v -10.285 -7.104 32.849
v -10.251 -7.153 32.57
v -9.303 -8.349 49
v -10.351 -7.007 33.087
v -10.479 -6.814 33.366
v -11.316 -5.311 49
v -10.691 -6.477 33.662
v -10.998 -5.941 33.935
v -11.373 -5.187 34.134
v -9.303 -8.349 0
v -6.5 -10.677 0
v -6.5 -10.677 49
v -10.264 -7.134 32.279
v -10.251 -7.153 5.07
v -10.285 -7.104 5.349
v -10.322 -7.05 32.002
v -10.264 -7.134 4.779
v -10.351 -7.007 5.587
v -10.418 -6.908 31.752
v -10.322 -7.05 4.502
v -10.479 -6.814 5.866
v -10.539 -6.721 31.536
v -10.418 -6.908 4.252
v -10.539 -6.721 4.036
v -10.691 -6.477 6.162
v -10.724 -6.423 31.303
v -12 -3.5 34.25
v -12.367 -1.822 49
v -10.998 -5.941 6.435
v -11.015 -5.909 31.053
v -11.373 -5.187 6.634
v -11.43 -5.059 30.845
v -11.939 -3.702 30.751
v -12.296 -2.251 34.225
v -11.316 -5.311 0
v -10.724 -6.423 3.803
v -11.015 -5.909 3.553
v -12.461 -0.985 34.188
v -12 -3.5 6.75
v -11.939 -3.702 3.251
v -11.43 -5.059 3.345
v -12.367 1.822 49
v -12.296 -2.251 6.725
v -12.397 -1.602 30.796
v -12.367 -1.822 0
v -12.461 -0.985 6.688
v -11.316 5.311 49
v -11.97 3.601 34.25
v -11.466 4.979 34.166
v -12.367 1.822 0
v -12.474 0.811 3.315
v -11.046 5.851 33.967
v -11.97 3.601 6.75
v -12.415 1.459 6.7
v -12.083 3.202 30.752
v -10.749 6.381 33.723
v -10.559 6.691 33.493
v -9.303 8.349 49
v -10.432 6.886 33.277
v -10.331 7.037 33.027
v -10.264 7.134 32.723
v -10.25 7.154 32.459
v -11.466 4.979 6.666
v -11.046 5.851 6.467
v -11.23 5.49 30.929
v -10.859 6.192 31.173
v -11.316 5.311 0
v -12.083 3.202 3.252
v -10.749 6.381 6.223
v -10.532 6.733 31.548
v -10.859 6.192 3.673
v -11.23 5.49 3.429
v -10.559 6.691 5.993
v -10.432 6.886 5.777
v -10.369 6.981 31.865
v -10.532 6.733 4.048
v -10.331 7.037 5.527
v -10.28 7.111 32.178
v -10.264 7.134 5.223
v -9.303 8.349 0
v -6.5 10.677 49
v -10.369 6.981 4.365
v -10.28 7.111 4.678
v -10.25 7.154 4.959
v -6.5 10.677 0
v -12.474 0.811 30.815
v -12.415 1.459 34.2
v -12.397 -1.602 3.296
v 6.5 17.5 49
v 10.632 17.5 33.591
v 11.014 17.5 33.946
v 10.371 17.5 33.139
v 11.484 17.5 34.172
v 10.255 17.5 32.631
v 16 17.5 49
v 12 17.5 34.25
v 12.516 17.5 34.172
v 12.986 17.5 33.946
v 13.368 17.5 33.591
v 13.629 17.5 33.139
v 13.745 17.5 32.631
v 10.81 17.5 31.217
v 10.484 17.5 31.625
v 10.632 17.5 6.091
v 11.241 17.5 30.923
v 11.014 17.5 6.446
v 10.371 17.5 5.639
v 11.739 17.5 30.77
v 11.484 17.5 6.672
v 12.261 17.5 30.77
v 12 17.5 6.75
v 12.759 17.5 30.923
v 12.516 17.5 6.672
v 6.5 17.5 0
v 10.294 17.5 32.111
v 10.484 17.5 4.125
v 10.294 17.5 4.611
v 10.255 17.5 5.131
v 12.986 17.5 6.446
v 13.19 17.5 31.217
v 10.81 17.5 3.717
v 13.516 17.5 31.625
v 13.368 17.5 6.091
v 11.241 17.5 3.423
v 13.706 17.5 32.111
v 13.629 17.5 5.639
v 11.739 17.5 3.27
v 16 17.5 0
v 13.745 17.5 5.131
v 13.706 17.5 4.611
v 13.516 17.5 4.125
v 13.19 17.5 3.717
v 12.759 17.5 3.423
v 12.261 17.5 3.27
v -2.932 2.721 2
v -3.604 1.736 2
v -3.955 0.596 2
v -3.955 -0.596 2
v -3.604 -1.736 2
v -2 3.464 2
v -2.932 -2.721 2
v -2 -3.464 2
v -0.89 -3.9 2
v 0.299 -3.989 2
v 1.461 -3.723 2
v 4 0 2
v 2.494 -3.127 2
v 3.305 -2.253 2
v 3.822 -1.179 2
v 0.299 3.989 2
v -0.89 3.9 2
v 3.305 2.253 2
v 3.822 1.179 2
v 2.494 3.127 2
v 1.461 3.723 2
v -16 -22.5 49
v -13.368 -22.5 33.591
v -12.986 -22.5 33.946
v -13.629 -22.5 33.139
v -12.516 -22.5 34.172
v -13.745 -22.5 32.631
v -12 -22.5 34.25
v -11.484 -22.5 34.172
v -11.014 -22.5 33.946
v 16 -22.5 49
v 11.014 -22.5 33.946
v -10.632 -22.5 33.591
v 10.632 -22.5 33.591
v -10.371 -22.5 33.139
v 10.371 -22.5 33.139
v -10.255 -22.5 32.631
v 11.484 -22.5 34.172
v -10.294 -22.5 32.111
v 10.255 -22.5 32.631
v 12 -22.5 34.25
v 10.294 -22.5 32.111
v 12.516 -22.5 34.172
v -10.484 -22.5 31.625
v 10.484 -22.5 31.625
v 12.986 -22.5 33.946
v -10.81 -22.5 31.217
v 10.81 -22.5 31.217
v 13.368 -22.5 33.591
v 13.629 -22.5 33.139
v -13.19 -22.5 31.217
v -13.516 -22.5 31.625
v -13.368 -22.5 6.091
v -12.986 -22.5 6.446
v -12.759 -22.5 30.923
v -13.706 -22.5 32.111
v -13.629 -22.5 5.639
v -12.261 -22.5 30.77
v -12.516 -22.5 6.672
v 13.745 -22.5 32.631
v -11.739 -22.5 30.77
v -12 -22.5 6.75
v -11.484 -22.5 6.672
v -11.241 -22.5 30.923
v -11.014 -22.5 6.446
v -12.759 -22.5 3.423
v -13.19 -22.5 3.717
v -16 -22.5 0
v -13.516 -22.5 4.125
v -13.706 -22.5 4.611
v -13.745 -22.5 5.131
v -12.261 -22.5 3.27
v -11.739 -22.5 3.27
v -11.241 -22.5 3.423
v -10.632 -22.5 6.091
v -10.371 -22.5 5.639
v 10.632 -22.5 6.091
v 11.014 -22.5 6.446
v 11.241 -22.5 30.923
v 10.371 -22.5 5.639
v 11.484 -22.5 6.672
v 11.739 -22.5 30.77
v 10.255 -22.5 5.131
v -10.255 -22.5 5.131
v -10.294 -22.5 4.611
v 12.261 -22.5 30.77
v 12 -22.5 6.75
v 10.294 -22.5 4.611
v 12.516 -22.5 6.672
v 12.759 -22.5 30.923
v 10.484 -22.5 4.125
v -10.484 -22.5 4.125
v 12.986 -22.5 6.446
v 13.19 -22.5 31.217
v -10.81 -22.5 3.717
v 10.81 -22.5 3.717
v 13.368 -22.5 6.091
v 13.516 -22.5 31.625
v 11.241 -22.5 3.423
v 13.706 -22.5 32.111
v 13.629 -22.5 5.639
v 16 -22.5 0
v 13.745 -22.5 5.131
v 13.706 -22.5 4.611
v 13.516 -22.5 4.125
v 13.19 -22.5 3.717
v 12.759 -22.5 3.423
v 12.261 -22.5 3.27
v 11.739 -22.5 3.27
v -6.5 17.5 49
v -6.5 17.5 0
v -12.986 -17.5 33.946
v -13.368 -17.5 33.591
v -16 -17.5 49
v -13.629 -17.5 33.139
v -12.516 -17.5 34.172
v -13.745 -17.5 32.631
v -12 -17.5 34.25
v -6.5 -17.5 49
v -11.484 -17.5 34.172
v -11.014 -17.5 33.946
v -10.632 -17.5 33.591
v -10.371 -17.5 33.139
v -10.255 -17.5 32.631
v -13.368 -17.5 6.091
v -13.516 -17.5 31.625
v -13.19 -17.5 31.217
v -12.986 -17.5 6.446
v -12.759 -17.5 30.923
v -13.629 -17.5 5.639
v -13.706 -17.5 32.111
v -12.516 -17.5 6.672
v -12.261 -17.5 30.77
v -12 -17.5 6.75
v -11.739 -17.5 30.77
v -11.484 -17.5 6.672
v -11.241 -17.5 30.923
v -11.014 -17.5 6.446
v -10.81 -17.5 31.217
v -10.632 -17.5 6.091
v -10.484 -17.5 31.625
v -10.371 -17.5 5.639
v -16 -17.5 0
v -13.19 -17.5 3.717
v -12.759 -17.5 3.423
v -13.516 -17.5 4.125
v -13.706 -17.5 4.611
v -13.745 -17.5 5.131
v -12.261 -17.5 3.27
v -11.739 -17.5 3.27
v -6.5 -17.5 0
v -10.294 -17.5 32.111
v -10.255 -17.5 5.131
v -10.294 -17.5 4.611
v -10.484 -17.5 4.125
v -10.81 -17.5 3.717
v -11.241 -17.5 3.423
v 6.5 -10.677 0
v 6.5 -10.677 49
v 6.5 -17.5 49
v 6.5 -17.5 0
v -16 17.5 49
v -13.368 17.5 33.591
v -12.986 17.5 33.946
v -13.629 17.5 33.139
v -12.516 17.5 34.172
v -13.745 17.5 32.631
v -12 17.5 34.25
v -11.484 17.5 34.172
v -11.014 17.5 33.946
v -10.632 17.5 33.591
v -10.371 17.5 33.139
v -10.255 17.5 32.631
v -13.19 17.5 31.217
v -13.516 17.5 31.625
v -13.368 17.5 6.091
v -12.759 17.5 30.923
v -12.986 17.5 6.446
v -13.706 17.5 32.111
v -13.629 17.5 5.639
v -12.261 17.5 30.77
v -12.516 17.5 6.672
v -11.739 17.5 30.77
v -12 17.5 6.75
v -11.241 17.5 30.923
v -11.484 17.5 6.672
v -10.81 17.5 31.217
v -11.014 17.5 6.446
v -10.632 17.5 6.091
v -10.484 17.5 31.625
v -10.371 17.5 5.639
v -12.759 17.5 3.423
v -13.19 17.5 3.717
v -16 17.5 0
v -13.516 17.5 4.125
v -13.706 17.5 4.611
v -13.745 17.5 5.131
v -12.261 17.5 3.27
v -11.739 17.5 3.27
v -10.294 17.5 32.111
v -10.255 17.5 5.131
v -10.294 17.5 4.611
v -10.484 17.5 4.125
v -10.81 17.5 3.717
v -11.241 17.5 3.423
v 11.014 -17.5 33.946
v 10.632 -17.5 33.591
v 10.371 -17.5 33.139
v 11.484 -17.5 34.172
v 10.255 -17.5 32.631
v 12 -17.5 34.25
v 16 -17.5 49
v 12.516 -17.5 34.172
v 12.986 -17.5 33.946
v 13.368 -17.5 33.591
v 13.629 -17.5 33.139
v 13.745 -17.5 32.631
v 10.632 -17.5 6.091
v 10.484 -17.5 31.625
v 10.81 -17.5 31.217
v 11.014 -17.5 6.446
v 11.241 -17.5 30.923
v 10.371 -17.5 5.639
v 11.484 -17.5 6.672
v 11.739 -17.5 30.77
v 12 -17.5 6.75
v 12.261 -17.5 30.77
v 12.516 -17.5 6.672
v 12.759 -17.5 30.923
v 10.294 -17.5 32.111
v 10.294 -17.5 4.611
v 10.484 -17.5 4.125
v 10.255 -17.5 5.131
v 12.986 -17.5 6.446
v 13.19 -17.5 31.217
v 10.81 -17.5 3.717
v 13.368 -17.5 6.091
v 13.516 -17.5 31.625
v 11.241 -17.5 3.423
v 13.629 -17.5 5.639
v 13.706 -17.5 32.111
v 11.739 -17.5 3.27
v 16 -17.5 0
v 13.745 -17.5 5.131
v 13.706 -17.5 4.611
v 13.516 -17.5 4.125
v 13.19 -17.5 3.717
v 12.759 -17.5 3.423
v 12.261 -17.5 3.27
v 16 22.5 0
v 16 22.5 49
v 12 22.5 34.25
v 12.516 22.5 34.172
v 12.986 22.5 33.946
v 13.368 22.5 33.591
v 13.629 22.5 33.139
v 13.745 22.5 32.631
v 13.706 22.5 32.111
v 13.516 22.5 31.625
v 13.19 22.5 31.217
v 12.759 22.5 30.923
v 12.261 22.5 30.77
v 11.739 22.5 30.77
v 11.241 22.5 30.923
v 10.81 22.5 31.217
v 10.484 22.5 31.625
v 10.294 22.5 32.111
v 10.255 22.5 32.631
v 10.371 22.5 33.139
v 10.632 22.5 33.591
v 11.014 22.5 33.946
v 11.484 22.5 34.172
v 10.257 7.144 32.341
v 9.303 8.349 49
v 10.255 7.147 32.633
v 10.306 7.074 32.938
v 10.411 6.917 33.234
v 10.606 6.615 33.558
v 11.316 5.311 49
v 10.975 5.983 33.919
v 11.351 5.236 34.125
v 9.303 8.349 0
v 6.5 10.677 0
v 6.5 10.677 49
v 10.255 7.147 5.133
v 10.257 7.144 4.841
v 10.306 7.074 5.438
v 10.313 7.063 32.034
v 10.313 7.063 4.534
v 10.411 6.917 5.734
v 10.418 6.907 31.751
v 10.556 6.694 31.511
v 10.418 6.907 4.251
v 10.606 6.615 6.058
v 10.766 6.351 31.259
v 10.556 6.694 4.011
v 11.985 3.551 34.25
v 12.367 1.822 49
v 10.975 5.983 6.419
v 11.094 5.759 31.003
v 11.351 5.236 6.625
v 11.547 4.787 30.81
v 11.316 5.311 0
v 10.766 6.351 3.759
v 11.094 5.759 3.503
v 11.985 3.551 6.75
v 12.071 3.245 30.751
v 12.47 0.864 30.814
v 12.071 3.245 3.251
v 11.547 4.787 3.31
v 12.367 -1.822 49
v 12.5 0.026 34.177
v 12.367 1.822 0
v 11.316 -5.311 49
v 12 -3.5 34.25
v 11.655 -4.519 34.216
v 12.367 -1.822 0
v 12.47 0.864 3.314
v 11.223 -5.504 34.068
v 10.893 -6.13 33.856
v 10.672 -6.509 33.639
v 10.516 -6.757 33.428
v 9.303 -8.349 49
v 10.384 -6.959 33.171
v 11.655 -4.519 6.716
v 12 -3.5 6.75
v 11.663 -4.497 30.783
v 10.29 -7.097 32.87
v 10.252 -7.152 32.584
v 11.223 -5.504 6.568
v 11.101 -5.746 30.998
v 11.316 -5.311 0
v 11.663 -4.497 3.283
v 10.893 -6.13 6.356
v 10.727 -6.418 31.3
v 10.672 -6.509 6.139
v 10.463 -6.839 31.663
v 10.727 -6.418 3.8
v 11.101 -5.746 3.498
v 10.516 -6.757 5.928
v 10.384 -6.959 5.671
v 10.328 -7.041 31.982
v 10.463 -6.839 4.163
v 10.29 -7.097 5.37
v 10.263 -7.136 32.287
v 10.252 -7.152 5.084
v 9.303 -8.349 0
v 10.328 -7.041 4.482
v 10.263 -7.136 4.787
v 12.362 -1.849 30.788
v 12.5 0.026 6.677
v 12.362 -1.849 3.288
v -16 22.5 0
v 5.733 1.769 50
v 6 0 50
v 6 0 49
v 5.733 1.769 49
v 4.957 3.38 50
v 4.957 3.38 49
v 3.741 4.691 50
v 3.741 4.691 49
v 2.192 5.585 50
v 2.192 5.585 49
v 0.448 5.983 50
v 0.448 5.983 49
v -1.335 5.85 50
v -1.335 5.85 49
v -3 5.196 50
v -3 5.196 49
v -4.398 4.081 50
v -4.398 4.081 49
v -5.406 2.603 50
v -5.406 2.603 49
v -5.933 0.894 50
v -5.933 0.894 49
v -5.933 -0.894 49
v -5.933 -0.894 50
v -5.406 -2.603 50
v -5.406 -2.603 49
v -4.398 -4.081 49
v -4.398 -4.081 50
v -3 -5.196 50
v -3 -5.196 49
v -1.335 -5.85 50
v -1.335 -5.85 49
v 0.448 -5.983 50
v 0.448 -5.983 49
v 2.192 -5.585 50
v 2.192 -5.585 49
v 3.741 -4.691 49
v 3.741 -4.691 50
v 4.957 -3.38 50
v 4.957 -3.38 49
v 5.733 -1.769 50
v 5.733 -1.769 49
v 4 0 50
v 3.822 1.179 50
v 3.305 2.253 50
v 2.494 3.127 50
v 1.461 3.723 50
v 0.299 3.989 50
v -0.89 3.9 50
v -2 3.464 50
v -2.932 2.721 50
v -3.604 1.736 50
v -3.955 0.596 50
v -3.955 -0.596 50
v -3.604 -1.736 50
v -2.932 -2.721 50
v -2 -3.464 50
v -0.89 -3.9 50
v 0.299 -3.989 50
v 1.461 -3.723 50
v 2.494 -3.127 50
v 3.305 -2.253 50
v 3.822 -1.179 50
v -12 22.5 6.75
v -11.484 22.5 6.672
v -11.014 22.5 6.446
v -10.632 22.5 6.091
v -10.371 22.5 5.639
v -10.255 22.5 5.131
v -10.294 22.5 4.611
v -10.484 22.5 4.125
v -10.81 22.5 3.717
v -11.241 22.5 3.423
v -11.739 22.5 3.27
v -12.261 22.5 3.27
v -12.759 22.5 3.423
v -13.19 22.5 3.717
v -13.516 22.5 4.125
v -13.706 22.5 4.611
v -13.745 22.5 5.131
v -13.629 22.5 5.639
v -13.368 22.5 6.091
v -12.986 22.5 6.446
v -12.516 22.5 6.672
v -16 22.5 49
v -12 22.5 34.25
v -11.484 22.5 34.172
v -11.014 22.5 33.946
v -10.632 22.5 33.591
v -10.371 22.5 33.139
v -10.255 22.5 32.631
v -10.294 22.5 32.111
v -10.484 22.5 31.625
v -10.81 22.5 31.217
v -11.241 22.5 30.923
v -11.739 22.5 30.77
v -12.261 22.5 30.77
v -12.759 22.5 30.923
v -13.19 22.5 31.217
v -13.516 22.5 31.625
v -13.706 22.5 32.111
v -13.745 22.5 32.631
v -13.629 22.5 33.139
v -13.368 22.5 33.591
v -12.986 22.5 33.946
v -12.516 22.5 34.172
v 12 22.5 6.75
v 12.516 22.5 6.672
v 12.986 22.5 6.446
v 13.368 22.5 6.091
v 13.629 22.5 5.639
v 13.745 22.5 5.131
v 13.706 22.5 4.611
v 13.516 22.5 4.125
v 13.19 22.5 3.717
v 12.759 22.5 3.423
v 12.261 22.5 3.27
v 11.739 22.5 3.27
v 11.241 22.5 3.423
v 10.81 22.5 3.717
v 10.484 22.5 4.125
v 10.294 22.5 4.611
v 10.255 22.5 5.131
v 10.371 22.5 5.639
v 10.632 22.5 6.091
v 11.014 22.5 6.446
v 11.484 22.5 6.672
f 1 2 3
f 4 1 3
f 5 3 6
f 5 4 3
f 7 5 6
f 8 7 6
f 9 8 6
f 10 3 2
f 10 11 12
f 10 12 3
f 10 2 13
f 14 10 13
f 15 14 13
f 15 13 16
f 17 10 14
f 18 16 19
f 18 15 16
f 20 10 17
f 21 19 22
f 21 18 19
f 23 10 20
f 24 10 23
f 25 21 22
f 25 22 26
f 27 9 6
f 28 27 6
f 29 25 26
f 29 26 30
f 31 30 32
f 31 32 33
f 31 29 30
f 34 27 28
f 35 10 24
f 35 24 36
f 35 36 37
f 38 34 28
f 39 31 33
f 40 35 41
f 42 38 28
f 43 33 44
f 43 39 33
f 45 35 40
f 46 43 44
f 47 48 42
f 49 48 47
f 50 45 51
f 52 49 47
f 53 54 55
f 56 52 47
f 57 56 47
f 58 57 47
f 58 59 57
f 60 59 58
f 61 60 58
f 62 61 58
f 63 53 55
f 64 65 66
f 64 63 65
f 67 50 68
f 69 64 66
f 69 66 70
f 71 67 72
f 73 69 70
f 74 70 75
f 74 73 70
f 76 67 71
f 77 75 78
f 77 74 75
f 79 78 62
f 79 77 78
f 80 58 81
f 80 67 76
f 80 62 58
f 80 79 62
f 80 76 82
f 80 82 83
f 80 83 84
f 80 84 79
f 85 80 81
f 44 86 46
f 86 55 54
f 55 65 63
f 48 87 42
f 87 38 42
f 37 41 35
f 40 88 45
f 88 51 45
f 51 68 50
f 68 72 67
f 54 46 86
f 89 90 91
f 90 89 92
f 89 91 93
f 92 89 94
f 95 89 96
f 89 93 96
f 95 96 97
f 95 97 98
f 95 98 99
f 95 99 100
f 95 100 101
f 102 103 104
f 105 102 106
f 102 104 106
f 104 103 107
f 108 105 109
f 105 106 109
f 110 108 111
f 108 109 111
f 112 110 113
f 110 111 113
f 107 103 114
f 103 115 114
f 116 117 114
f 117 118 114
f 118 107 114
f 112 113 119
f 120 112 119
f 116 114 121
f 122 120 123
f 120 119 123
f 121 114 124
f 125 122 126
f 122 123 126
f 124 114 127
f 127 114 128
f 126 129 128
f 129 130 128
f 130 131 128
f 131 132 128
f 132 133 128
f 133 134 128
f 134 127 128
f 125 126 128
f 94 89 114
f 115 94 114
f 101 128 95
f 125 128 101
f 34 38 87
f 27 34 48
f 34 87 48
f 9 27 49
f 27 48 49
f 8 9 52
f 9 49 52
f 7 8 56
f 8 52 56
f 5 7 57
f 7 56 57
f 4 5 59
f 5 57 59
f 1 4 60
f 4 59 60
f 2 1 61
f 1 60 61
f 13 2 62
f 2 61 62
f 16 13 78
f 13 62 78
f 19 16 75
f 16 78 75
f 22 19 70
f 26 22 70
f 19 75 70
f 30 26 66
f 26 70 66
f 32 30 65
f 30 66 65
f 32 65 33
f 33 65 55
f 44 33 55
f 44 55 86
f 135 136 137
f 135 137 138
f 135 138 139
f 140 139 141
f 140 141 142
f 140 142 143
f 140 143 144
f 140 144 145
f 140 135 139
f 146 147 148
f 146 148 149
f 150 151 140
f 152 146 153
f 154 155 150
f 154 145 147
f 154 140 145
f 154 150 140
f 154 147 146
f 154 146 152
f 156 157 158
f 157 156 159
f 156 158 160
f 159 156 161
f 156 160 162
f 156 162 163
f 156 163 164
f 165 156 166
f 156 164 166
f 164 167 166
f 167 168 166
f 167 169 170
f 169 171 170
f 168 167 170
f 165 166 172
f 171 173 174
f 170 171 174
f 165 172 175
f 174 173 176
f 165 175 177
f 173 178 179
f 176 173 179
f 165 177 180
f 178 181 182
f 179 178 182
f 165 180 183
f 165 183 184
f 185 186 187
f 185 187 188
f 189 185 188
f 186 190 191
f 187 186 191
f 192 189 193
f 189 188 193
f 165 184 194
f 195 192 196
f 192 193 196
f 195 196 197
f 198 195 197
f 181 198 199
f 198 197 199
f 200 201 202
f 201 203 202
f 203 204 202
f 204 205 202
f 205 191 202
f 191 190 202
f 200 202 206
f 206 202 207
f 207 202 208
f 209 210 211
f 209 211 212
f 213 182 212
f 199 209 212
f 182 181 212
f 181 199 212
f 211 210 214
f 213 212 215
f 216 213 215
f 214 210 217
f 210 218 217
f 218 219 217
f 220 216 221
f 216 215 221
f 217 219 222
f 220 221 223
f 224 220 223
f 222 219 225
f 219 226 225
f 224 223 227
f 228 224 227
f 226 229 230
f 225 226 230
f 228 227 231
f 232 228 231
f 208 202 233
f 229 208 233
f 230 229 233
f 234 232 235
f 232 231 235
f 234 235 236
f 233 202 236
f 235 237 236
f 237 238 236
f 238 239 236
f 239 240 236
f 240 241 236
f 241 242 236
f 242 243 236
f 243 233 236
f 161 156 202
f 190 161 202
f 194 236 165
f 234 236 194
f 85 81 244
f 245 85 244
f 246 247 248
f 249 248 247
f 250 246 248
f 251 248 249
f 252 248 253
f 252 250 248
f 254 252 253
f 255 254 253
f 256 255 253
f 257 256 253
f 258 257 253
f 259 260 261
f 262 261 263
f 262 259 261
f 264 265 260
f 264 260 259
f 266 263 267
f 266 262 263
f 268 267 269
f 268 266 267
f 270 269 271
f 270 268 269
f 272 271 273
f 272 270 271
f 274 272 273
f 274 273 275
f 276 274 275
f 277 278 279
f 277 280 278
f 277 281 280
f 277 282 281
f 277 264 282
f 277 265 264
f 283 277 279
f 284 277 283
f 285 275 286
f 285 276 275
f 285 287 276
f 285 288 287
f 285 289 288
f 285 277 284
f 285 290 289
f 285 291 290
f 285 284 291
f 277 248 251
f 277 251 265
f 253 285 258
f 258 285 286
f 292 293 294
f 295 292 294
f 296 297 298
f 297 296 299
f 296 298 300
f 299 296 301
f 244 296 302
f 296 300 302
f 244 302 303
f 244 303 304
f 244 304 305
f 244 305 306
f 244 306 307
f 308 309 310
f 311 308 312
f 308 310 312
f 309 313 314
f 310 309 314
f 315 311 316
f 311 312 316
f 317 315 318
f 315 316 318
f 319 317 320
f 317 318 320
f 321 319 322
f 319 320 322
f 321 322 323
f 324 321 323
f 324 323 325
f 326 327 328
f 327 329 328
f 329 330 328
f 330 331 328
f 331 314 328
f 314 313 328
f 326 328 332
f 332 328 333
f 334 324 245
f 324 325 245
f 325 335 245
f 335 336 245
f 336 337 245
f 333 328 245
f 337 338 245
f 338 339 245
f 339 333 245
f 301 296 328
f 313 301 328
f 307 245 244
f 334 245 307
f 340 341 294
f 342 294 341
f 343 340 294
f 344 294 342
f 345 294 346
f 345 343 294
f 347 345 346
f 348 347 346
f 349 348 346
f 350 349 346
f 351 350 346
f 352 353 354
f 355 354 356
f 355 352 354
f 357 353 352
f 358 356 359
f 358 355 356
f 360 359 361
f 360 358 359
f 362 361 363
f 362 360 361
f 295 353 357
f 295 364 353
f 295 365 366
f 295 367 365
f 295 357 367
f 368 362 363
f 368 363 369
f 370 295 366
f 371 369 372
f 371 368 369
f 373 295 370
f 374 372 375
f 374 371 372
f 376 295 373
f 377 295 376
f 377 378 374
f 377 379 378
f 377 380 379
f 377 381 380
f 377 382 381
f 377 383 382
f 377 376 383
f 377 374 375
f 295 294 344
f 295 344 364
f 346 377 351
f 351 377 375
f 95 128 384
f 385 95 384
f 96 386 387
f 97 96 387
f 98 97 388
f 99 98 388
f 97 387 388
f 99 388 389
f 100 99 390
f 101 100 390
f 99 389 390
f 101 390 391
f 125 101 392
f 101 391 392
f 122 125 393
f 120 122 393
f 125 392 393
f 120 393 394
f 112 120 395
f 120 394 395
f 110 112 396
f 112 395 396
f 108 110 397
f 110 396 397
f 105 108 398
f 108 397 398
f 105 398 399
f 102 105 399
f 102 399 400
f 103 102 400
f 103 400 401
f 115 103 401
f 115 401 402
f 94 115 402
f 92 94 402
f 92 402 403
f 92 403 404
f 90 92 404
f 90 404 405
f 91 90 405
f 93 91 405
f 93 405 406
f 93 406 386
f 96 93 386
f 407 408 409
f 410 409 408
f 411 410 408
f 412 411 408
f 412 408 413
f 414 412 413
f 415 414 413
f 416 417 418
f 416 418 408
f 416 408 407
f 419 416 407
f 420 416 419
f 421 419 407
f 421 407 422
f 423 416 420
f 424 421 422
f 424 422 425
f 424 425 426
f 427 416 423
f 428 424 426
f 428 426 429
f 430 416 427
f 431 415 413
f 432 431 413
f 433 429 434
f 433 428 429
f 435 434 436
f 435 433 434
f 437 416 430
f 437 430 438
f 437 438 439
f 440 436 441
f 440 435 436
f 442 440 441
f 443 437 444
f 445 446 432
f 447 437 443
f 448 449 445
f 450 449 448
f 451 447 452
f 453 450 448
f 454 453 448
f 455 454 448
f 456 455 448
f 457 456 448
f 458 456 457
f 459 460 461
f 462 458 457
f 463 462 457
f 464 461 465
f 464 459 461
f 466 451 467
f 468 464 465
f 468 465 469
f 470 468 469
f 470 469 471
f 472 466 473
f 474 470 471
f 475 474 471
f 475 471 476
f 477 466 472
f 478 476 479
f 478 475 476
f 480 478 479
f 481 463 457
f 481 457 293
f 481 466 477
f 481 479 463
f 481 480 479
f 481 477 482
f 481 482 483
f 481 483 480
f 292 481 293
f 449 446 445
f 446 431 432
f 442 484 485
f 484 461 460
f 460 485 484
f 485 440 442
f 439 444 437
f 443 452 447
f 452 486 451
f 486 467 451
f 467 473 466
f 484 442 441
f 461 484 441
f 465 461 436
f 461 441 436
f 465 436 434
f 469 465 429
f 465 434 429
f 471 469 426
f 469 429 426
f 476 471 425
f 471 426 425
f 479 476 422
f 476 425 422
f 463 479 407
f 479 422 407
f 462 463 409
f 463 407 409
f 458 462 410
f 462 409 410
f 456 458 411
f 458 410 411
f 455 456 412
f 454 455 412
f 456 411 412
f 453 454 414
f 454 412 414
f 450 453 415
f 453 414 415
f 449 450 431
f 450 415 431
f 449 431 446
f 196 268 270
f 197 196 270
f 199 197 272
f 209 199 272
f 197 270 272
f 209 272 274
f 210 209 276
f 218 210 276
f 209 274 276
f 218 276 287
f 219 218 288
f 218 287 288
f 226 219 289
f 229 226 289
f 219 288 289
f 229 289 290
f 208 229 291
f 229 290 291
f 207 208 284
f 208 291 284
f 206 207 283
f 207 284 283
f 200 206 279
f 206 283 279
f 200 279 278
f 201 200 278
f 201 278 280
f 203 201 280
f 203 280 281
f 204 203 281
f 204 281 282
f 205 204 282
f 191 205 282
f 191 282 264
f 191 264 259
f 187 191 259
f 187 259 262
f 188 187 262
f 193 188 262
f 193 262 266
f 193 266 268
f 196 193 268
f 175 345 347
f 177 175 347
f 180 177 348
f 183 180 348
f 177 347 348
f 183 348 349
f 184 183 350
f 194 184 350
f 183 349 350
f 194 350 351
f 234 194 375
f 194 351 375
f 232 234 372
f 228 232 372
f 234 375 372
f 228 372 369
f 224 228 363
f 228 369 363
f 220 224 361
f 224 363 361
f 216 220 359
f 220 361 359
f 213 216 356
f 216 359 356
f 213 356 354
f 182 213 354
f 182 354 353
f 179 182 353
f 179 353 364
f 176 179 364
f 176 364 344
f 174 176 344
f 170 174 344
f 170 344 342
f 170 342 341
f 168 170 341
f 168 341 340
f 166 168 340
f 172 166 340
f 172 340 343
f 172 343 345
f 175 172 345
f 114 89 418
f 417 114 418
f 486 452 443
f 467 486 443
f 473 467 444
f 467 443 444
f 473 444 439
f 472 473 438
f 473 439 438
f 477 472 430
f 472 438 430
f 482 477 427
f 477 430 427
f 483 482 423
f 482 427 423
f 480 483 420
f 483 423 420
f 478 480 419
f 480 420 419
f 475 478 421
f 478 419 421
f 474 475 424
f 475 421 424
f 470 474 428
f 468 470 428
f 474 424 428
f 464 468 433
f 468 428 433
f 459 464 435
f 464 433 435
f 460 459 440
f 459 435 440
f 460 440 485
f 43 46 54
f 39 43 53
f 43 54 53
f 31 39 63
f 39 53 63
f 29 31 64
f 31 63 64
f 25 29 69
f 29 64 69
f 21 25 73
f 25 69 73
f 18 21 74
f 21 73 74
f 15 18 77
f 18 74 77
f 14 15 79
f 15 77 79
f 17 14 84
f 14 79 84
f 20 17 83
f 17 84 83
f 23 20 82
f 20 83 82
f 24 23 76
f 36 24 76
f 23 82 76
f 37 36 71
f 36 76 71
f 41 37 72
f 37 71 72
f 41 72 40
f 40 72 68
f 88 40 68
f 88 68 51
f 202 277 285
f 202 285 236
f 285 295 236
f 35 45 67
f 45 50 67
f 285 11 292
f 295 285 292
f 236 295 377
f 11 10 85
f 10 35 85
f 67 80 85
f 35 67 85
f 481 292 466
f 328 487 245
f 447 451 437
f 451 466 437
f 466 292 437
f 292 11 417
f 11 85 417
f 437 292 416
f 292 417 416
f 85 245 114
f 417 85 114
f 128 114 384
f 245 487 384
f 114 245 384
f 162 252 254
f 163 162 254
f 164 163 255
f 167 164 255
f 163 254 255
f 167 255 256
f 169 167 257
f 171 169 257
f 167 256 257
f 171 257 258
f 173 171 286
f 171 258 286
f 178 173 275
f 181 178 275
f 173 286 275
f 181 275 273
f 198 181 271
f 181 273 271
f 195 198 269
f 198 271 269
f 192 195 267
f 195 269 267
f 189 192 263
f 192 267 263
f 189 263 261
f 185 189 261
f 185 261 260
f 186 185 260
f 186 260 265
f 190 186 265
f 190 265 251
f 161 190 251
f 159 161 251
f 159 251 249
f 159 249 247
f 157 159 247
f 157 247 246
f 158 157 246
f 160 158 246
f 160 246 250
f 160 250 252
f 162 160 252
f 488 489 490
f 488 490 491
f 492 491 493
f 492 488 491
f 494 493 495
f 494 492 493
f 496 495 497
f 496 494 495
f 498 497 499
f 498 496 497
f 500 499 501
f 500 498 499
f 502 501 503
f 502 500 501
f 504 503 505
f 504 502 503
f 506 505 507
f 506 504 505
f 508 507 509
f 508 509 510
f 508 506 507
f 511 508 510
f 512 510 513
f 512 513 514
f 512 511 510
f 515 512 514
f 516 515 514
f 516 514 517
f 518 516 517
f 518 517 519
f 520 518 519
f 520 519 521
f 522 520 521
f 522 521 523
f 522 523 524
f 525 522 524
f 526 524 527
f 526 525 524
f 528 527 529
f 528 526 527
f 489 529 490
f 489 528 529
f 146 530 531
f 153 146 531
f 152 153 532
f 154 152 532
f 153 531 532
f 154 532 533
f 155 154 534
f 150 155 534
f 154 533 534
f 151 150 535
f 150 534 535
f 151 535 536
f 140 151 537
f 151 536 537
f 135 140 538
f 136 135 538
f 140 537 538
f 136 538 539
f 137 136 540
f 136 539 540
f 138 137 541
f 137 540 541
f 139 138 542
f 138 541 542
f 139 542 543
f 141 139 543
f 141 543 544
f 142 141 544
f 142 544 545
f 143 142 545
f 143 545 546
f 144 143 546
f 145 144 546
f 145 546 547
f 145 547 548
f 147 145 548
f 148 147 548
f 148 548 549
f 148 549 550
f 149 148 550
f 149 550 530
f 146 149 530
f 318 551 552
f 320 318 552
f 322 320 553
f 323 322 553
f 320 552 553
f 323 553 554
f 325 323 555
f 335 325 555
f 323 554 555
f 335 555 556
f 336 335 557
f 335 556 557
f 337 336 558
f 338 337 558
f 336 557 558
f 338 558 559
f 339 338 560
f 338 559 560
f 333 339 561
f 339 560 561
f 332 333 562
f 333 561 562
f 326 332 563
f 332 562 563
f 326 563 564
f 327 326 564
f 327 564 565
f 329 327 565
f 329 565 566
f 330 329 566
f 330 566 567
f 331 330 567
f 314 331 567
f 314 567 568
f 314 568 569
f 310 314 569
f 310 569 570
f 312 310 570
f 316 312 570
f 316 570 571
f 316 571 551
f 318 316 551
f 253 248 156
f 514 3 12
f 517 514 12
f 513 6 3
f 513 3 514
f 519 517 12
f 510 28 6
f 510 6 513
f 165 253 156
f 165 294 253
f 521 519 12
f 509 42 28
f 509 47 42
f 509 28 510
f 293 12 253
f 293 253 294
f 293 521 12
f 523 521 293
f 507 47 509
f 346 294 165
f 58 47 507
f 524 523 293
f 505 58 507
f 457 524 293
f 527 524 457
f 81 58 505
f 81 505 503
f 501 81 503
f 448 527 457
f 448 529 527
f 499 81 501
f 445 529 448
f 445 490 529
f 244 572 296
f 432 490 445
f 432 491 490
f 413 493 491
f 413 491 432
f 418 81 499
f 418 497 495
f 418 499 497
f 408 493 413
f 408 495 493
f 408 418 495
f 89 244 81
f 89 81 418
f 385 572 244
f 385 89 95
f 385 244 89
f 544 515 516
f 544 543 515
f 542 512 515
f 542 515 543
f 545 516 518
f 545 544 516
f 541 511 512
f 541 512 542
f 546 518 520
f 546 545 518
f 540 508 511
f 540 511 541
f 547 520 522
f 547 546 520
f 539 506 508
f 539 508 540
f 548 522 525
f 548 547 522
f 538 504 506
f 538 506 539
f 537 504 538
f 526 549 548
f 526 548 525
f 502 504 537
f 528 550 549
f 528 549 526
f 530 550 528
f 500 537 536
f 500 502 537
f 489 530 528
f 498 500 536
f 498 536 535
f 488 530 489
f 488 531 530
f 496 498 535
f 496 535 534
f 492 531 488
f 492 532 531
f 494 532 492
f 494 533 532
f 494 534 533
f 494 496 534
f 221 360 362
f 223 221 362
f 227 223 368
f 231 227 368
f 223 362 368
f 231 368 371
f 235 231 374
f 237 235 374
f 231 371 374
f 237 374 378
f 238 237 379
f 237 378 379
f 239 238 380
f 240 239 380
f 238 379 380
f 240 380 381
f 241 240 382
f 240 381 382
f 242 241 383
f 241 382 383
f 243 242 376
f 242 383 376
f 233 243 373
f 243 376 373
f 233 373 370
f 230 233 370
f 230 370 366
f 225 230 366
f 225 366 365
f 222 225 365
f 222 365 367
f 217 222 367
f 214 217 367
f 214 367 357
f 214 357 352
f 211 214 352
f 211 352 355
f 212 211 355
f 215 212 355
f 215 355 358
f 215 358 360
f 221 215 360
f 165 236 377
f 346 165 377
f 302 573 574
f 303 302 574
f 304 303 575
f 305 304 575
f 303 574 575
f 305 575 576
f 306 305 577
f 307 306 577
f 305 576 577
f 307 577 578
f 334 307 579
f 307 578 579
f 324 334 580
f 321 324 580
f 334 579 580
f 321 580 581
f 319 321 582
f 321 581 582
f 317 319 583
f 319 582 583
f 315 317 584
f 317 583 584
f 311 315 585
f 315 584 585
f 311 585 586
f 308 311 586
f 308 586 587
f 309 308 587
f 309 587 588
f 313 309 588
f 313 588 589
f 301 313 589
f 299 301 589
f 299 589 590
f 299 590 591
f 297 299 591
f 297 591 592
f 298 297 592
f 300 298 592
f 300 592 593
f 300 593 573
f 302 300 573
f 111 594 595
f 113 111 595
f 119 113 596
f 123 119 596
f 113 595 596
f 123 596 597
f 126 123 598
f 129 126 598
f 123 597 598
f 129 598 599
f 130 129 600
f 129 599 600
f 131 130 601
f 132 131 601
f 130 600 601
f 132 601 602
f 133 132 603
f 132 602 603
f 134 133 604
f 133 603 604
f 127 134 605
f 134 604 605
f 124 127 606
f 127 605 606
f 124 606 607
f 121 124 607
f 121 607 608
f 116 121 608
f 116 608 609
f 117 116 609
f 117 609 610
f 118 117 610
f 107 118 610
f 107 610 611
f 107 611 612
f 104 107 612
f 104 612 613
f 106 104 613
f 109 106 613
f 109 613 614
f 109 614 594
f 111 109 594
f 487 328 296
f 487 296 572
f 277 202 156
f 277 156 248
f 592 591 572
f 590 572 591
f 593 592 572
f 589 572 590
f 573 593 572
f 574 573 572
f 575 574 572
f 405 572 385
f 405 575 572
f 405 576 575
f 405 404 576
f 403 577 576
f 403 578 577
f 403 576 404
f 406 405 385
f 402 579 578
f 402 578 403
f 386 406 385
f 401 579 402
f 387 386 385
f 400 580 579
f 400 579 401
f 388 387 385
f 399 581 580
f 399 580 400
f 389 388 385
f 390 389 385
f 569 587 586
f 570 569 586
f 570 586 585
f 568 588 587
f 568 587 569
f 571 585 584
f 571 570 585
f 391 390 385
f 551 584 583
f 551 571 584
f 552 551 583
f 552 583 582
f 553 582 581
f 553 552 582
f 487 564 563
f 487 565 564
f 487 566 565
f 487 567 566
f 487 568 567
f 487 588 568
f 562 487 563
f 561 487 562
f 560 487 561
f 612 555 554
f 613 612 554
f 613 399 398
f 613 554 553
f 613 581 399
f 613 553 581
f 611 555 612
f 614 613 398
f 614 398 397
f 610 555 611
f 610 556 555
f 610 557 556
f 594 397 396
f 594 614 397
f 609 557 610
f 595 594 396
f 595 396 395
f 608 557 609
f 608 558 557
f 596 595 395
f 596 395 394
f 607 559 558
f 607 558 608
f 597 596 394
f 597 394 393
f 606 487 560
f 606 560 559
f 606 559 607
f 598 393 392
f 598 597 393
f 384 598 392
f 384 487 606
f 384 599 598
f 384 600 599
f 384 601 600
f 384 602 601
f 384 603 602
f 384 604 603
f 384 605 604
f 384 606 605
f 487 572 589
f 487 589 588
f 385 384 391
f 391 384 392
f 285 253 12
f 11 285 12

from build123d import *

# Parameters (mm, degrees)
BOSS_EXTRUDE1_DEPTH = 49
SKETCH2_R           = 4
CUT_EXTRUDE1_DEPTH  = 47
SKETCH7_W           = 32
SKETCH7_H           = 5
BOSS_EXTRUDE2_DEPTH = 49
SKETCH8_R           = 1.75
CUT_EXTRUDE4_DEPTH  = 69.425141578
BOSS_EXTRUDE3_START = 1
SKETCH9_R           = 6
SKETCH9_R_2         = 4
BOSS_EXTRUDE3_DEPTH = 1


with BuildPart() as part:
    # Sketch1 → Boss-Extrude1 (new body)
    with BuildSketch(Plane.XY):
        with BuildLine():
            Line((-6.5, 17.5), (6.5, 17.5))
            Line((6.5, 17.5), (6.5, 10.677078252))
            ThreePointArc((6.5, 10.677078252), (12.5, 0), (6.5, -10.677078252))
            Line((6.5, -10.677078252), (6.5, -17.5))
            Line((6.5, -17.5), (-6.5, -17.5))
            Line((-6.5, -17.5), (-6.5, -10.677078252))
            ThreePointArc((-6.5, -10.677078252), (-12.5, 0), (-6.5, 10.677078252))
            Line((-6.5, 10.677078252), (-6.5, 17.5))
        make_face()
    extrude(amount=BOSS_EXTRUDE1_DEPTH)

    # Sketch2 → Cut-Extrude1 (cut)
    with BuildSketch(Plane.XY.offset(49)):
        Circle(SKETCH2_R)
    extrude(amount=-CUT_EXTRUDE1_DEPTH, mode=Mode.SUBTRACT)

    # Sketch7 → Boss-Extrude2 (add)
    with BuildSketch(Plane.XY):
        with Locations((0, 20)):
            Rectangle(SKETCH7_W, SKETCH7_H)
        with Locations((0, -20)):
            Rectangle(SKETCH7_W, SKETCH7_H)
    extrude(amount=BOSS_EXTRUDE2_DEPTH)

    # Sketch8 → Cut-Extrude4 (cut, through all)
    with BuildSketch(Plane(origin=(0, 22.5, 0), x_dir=(1, 0, 0), z_dir=(0, 1, 0))):
        with Locations(Location((-12, -5, 0), (0, 0, 270))):
            Circle(SKETCH8_R)
        with Locations(Location((-12, -32.5, 0), (0, 0, 270))):
            Circle(SKETCH8_R)
        with Locations(Location((12, -32.5, 0), (0, 0, 270))):
            Circle(SKETCH8_R)
        with Locations(Location((12, -5, 0), (0, 0, 270))):
            Circle(SKETCH8_R)
    extrude(amount=-CUT_EXTRUDE4_DEPTH, mode=Mode.SUBTRACT)

    # Sketch9 → Boss-Extrude3 (add)
    with BuildSketch(Plane.XY.offset(49).offset(BOSS_EXTRUDE3_START)):
        Circle(SKETCH9_R)
        Circle(SKETCH9_R_2, mode=Mode.SUBTRACT)
    extrude(amount=-BOSS_EXTRUDE3_DEPTH)


solid = part.part
